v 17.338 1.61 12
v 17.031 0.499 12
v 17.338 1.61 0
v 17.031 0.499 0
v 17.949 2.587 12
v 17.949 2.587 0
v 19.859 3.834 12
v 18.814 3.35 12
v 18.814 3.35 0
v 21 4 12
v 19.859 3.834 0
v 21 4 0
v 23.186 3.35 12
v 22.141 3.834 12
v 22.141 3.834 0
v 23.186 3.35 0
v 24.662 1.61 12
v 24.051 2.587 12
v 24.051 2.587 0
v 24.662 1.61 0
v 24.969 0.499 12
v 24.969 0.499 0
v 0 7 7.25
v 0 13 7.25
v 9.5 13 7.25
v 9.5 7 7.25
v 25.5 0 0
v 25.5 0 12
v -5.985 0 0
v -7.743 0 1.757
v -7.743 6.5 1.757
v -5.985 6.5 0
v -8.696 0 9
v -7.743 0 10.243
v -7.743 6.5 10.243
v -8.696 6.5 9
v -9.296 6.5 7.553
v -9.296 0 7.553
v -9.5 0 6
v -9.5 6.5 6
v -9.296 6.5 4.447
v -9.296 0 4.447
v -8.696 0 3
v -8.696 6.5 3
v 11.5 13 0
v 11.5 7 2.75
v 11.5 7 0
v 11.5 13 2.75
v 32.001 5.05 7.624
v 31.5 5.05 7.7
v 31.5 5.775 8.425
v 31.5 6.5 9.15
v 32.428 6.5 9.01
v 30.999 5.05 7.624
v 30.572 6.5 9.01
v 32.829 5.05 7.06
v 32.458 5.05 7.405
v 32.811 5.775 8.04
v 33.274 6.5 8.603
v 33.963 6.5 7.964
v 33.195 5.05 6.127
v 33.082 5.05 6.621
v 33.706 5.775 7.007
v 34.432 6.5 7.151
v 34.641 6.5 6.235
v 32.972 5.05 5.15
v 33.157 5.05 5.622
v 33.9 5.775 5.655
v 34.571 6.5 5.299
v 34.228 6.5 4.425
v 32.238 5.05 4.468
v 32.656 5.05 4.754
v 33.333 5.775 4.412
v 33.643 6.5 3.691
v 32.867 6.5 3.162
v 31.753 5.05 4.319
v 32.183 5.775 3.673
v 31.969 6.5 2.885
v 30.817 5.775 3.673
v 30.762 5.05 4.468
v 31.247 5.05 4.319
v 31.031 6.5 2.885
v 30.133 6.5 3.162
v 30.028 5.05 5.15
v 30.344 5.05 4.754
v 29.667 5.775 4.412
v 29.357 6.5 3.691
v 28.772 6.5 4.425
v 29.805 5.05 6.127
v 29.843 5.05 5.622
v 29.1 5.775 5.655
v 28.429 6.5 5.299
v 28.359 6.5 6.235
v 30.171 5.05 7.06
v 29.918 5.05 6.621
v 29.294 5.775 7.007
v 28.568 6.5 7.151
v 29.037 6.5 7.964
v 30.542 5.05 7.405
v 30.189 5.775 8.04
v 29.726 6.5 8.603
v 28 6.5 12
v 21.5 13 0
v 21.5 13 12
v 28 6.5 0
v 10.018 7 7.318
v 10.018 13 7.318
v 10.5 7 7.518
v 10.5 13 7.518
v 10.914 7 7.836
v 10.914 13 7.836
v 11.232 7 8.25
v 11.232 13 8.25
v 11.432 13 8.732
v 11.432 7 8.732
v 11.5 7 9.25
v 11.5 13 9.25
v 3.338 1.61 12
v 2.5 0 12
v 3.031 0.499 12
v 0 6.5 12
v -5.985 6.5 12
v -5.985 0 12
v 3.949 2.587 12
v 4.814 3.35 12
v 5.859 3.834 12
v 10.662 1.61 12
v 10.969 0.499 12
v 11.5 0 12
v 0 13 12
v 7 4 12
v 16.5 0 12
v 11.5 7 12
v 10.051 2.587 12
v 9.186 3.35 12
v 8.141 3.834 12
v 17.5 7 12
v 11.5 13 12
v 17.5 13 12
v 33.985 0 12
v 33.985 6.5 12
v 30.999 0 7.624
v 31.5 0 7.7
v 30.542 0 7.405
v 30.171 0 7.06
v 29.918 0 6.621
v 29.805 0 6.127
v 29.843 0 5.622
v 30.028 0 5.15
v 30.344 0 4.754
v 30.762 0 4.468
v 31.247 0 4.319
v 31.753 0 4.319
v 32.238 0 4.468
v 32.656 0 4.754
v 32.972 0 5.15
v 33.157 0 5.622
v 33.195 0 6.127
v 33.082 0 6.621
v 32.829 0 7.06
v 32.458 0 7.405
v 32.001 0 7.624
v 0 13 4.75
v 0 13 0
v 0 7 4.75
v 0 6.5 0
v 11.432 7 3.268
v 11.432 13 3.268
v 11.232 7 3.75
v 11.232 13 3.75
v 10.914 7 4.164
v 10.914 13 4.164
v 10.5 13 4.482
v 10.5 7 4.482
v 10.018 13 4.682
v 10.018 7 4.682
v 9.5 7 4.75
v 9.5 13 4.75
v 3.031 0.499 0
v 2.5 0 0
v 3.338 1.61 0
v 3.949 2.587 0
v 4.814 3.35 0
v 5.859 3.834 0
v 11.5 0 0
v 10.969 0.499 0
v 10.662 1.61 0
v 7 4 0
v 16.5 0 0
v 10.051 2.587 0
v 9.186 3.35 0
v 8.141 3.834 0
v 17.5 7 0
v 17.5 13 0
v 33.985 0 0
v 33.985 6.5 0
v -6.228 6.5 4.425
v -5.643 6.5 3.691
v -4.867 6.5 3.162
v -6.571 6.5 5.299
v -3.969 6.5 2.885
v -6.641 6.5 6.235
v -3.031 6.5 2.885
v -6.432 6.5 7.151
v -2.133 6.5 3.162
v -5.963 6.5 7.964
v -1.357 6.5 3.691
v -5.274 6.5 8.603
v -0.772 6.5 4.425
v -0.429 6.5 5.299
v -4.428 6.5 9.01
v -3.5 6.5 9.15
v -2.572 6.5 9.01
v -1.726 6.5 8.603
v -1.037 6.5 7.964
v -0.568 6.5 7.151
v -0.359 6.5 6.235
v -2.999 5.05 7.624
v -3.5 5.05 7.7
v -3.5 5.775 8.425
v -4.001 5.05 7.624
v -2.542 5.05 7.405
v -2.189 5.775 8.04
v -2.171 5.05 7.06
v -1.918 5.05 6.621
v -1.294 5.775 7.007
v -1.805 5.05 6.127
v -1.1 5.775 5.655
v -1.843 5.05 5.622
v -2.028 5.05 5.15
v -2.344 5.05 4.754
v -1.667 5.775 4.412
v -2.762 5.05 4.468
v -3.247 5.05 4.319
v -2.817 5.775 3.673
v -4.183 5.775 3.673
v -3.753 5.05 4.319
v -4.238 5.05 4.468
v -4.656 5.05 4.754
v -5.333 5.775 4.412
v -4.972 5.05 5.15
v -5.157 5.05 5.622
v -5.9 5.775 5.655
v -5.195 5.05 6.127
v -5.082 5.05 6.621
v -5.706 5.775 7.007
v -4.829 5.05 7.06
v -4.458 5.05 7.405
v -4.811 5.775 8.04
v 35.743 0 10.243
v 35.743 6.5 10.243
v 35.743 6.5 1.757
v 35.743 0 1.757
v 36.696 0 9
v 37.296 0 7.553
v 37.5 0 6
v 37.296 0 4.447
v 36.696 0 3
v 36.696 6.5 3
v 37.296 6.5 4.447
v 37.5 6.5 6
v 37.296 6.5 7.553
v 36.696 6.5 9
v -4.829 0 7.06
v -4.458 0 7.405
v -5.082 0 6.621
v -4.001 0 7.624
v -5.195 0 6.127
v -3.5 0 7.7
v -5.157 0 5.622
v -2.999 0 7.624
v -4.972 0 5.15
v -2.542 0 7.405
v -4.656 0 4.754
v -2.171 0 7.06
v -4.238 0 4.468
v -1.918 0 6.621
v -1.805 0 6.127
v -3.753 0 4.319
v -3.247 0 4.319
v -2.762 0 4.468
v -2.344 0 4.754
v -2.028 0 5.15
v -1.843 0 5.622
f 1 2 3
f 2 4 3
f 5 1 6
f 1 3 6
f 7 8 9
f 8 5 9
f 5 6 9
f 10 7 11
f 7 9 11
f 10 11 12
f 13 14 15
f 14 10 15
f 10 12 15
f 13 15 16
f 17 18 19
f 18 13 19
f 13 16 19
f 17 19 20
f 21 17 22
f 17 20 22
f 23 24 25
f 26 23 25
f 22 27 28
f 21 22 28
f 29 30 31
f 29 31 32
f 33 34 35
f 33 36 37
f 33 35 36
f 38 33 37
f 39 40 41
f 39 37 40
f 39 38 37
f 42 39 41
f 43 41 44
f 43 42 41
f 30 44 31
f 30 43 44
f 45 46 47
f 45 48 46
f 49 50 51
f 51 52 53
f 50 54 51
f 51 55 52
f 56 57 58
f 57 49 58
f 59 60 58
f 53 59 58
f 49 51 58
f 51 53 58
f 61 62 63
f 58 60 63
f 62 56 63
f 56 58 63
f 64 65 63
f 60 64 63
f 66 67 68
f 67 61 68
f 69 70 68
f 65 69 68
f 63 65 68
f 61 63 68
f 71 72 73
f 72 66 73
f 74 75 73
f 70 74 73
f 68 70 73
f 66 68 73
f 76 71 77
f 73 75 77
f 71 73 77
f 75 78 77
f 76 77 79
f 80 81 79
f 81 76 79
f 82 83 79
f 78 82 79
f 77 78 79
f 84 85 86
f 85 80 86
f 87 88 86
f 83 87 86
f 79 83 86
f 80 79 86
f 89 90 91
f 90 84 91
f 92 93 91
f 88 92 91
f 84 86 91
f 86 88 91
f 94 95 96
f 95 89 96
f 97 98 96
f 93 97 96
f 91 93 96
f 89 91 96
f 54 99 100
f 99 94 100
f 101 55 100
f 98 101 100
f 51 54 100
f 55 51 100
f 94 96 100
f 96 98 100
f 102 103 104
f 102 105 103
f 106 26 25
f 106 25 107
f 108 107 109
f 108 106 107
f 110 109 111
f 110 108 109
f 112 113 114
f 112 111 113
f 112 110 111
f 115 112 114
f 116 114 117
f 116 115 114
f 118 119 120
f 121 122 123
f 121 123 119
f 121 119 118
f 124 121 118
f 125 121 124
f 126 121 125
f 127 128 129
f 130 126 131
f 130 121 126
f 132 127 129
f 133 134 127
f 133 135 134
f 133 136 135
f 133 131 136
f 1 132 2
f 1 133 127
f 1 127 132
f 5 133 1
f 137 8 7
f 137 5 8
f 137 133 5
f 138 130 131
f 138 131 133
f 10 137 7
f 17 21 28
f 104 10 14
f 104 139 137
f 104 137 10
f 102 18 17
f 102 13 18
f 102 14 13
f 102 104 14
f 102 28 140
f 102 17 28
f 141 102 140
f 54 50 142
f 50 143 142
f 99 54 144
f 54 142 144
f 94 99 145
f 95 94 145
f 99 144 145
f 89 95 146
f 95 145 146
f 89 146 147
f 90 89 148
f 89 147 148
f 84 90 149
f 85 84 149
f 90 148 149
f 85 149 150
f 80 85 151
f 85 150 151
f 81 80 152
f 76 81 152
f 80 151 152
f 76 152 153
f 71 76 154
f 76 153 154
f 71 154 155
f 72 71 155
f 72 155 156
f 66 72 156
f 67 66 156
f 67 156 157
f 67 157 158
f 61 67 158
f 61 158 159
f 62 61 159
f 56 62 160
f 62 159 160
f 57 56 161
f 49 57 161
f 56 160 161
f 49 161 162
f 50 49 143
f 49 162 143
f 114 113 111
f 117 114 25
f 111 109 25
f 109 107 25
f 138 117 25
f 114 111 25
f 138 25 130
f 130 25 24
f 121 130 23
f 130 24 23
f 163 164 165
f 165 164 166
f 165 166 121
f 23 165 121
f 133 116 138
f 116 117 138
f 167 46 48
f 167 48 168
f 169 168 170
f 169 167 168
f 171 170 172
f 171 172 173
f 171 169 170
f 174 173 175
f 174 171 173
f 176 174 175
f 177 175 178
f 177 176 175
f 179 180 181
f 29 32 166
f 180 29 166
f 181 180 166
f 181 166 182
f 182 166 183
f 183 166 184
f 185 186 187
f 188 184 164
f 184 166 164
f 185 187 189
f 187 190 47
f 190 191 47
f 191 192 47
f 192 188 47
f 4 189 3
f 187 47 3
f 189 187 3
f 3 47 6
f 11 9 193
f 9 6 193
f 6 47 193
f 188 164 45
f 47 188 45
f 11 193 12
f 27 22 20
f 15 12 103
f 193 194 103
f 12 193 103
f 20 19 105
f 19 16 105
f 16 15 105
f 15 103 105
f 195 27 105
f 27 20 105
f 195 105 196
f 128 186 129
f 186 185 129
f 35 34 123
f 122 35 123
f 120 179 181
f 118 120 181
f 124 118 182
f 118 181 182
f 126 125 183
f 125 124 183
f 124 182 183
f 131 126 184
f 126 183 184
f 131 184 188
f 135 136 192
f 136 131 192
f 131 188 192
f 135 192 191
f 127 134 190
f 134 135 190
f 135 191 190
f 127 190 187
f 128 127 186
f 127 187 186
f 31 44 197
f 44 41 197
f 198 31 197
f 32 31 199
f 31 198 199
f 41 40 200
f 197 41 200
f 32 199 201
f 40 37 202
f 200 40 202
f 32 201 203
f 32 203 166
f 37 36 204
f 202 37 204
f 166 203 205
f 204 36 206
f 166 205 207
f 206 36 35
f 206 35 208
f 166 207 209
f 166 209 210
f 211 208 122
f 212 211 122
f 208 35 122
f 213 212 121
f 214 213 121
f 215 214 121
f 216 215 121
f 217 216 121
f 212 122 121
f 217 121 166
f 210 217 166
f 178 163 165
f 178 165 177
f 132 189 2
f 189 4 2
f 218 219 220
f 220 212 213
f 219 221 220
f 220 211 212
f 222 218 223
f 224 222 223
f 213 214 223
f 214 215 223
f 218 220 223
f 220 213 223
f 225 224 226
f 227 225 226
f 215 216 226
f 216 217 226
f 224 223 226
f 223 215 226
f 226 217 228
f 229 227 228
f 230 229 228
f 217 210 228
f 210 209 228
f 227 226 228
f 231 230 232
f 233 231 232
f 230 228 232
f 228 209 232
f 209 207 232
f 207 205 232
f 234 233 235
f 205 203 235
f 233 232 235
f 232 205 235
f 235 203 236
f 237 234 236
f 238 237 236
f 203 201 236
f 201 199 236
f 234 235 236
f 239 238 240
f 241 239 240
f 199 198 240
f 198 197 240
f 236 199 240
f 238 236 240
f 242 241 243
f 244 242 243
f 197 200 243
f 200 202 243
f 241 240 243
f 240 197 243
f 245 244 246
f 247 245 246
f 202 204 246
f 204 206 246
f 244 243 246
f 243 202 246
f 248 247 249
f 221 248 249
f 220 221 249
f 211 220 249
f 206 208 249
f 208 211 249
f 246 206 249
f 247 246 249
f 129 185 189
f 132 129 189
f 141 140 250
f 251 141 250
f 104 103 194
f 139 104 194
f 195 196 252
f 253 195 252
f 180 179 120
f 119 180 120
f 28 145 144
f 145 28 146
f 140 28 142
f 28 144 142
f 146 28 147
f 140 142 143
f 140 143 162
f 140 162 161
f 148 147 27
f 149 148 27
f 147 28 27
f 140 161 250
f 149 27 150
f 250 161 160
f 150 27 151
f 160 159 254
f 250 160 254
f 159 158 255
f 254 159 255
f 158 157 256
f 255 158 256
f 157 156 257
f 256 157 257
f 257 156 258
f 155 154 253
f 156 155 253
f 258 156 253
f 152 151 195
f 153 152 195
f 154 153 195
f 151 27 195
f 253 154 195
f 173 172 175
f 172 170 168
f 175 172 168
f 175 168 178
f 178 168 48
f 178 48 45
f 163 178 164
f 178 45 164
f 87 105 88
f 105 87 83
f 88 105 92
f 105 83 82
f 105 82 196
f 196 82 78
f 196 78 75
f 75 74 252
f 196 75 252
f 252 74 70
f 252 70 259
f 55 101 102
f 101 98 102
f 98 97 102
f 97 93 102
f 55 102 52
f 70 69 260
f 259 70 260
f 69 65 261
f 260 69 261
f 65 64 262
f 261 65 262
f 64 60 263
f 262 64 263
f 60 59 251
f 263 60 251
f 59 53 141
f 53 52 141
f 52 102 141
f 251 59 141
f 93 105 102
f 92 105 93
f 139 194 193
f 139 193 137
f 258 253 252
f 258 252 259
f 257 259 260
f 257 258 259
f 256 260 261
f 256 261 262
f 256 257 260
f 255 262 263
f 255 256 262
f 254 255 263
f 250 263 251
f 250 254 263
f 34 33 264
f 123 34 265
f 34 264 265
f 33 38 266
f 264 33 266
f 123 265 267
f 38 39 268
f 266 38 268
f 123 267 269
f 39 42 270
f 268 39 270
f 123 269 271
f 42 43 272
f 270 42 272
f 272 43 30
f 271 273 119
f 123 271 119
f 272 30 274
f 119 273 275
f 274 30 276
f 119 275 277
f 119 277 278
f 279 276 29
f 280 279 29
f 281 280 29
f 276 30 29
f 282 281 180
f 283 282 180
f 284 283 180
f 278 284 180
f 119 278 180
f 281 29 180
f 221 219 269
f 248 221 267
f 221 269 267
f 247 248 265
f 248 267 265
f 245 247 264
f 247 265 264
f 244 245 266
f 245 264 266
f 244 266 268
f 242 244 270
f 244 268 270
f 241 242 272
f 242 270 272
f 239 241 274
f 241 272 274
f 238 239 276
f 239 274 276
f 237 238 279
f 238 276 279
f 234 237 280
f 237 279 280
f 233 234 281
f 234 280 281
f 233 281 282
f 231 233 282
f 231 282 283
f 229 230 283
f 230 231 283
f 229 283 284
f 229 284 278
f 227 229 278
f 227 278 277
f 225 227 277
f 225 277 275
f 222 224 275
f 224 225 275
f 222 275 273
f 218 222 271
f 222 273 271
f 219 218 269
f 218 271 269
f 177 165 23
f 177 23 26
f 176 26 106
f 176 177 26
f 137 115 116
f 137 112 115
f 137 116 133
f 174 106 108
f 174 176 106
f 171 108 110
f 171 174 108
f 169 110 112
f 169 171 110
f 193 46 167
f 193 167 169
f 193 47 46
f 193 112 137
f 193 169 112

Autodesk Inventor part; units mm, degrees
ref_plane "YZ Plane" through (0, 0, 0) normal (1, 0, 0) x (0, 1, 0)
sketch "Sketch1" plane through (0, 0, 0) normal (0, 0, 1) x (1, 0, 0)
  line L0 (0, 0) -> (28, 0)
  line L1 (28, 0) -> (28, 13)
  line L2 (28, 13) -> (0, 13)
  line L3 (0, 13) -> (0, 0)
  circle A0 centre (7, 0) radius 4
  circle A1 centre (21, 0) radius 4
  point P0 (3, 0)
  point P1 (11, 0)
  point P2 (17, 0)
  point P3 (25, 0)
  dimension "d0" = 28
  dimension "d1" = 13
  dimension "d2" = 8
  dimension "d3" = 8
  dimension "d4" = 14
  dimension "d5" = 7
  dimension "d6" = 7
extrude "Extrusion1" add sketch "Sketch1" along normal blind 12 contours A1 L0 A0 L3 L2 L1
chamfer "Chamfer1" distance 6.5 angle 45 1 edges at (28, 13, 6)
sketch "Sketch2" plane through (0, 13, 12) normal (0, 1, 0) x (1, 0, 0)
  line L0 (0, 12) -> (0, 0) projected
  line L1 (0, 7.25) -> (11.5, 7.25)
  line L2 (11.5, 7.25) -> (11.5, 12)
  line L3 (21.5, 12) -> (0, 12) projected
  line L4 (17.5, 12) -> (17.5, 0)
  line L5 (11, 0) -> (17, 0) projected
  line L6 (0, 4.75) -> (11.5, 4.75)
  line L7 (11.5, 4.75) -> (11.5, 0)
  line L8 (11, 0) -> (3, 0) projected
  line L9 (11.5, 12) -> (17.5, 12)
  line L10 (25, 12) -> (17, 12) projected
  line L11 (17.5, 0) -> (11.5, 0)
  line L12 (0, 4.75) -> (0, 7.25)
  dimension "d12" = 6
  dimension "d13" = 2.5
  dimension "d14" = 11.5
extrude "Extrusion2" cut sketch "Sketch2" against normal blind 6 contours L1 L2 L3 L4 L11 L5 L7 L6 L0
fillet "Fillet1" radius 2 2 edges at (11.5, 10, 4.75) (11.5, 10, 7.25)
chamfer "Chamfer2" distance 0.5 angle 45 4 edges at (3, 0, 6) (11, 0, 6) (17, 0, 6) (25, 0, 6)
ref_plane "Work Plane1" through (0, 0, 6) normal (0, 0, 1) x (1, 0, 0)
ref_plane "Work Plane3" through (14, 0, 12) normal (1, 0, 0) x (0, 0, -1)
sketch "Sketch5" plane through (28, 0, 0) normal (0, -1, 0) x (1, 0, 0)
  circle A0 centre (3.5, 6) radius 1.5
  line L0 (-2.5, 0) -> (-2.5, 12) projected
  line L1 (-2.5, 0) -> (0, 0) projected
  line L2 (0, 0) -> (0, 12) projected
  line L3 (-2.5, 12) -> (0, 12) projected
  circle A1 centre (3.5, 6) radius 3.5
  line L4 (0, 0) -> (0, 12) projected
  line L5 (-6.5, 12) -> (0, 12) projected
  line L6 (0, 12) -> (5.9853, 12)
  line L7 (0, 0) -> (-6.5, 0) projected
  line L8 (0, 0) -> (5.9853, 0)
  line L9 (5.9853, 0) -> (7.7426, 1.7574)
  line L10 (5.9853, 12) -> (7.7426, 10.2426)
  circle A2 centre (3.5, 6) radius 6
  point P0 (-28, 0)
  point P1 (0, 6)
  dimension "d26" = 3
  dimension "d28" = 7
  dimension "d38" = 135
extrude "Extrusion3" add sketch "Sketch5" against normal blind 6.5 contours A0 | L2 A2 L8 | A1 | A2 L2 | L2 L6 A2 | A2 L9 L8 | L6 L10 A2 picked at (0.8638, 10.4147)
sketch "Sketch6" plane through (28, 6.5, 0) normal (0, 1, 0) x (1, 0, 0)
  arc A0 (7.7426, -10.2426) -> (7.7426, -1.7574) centre (3.5, -6) ccw projected
  point P0 (-28, 0)
hole "Hole1" at (31.5, 6.5, 6) direction (0, -1, 0) diameter 3.4 depth 8 countersink diameter 6.3 countersink angle 90 clearance for "Flat Head Machine Screw" size "M3" standard "Ansi Metric M Profile"
mirror "Mirror2" about plane through (14, 0, 12) normal (1, 0, 0) of "Extrusion3", "Hole1"
equation "\"d5\" = d6"
properties part number "Magnet Mount Lower"
